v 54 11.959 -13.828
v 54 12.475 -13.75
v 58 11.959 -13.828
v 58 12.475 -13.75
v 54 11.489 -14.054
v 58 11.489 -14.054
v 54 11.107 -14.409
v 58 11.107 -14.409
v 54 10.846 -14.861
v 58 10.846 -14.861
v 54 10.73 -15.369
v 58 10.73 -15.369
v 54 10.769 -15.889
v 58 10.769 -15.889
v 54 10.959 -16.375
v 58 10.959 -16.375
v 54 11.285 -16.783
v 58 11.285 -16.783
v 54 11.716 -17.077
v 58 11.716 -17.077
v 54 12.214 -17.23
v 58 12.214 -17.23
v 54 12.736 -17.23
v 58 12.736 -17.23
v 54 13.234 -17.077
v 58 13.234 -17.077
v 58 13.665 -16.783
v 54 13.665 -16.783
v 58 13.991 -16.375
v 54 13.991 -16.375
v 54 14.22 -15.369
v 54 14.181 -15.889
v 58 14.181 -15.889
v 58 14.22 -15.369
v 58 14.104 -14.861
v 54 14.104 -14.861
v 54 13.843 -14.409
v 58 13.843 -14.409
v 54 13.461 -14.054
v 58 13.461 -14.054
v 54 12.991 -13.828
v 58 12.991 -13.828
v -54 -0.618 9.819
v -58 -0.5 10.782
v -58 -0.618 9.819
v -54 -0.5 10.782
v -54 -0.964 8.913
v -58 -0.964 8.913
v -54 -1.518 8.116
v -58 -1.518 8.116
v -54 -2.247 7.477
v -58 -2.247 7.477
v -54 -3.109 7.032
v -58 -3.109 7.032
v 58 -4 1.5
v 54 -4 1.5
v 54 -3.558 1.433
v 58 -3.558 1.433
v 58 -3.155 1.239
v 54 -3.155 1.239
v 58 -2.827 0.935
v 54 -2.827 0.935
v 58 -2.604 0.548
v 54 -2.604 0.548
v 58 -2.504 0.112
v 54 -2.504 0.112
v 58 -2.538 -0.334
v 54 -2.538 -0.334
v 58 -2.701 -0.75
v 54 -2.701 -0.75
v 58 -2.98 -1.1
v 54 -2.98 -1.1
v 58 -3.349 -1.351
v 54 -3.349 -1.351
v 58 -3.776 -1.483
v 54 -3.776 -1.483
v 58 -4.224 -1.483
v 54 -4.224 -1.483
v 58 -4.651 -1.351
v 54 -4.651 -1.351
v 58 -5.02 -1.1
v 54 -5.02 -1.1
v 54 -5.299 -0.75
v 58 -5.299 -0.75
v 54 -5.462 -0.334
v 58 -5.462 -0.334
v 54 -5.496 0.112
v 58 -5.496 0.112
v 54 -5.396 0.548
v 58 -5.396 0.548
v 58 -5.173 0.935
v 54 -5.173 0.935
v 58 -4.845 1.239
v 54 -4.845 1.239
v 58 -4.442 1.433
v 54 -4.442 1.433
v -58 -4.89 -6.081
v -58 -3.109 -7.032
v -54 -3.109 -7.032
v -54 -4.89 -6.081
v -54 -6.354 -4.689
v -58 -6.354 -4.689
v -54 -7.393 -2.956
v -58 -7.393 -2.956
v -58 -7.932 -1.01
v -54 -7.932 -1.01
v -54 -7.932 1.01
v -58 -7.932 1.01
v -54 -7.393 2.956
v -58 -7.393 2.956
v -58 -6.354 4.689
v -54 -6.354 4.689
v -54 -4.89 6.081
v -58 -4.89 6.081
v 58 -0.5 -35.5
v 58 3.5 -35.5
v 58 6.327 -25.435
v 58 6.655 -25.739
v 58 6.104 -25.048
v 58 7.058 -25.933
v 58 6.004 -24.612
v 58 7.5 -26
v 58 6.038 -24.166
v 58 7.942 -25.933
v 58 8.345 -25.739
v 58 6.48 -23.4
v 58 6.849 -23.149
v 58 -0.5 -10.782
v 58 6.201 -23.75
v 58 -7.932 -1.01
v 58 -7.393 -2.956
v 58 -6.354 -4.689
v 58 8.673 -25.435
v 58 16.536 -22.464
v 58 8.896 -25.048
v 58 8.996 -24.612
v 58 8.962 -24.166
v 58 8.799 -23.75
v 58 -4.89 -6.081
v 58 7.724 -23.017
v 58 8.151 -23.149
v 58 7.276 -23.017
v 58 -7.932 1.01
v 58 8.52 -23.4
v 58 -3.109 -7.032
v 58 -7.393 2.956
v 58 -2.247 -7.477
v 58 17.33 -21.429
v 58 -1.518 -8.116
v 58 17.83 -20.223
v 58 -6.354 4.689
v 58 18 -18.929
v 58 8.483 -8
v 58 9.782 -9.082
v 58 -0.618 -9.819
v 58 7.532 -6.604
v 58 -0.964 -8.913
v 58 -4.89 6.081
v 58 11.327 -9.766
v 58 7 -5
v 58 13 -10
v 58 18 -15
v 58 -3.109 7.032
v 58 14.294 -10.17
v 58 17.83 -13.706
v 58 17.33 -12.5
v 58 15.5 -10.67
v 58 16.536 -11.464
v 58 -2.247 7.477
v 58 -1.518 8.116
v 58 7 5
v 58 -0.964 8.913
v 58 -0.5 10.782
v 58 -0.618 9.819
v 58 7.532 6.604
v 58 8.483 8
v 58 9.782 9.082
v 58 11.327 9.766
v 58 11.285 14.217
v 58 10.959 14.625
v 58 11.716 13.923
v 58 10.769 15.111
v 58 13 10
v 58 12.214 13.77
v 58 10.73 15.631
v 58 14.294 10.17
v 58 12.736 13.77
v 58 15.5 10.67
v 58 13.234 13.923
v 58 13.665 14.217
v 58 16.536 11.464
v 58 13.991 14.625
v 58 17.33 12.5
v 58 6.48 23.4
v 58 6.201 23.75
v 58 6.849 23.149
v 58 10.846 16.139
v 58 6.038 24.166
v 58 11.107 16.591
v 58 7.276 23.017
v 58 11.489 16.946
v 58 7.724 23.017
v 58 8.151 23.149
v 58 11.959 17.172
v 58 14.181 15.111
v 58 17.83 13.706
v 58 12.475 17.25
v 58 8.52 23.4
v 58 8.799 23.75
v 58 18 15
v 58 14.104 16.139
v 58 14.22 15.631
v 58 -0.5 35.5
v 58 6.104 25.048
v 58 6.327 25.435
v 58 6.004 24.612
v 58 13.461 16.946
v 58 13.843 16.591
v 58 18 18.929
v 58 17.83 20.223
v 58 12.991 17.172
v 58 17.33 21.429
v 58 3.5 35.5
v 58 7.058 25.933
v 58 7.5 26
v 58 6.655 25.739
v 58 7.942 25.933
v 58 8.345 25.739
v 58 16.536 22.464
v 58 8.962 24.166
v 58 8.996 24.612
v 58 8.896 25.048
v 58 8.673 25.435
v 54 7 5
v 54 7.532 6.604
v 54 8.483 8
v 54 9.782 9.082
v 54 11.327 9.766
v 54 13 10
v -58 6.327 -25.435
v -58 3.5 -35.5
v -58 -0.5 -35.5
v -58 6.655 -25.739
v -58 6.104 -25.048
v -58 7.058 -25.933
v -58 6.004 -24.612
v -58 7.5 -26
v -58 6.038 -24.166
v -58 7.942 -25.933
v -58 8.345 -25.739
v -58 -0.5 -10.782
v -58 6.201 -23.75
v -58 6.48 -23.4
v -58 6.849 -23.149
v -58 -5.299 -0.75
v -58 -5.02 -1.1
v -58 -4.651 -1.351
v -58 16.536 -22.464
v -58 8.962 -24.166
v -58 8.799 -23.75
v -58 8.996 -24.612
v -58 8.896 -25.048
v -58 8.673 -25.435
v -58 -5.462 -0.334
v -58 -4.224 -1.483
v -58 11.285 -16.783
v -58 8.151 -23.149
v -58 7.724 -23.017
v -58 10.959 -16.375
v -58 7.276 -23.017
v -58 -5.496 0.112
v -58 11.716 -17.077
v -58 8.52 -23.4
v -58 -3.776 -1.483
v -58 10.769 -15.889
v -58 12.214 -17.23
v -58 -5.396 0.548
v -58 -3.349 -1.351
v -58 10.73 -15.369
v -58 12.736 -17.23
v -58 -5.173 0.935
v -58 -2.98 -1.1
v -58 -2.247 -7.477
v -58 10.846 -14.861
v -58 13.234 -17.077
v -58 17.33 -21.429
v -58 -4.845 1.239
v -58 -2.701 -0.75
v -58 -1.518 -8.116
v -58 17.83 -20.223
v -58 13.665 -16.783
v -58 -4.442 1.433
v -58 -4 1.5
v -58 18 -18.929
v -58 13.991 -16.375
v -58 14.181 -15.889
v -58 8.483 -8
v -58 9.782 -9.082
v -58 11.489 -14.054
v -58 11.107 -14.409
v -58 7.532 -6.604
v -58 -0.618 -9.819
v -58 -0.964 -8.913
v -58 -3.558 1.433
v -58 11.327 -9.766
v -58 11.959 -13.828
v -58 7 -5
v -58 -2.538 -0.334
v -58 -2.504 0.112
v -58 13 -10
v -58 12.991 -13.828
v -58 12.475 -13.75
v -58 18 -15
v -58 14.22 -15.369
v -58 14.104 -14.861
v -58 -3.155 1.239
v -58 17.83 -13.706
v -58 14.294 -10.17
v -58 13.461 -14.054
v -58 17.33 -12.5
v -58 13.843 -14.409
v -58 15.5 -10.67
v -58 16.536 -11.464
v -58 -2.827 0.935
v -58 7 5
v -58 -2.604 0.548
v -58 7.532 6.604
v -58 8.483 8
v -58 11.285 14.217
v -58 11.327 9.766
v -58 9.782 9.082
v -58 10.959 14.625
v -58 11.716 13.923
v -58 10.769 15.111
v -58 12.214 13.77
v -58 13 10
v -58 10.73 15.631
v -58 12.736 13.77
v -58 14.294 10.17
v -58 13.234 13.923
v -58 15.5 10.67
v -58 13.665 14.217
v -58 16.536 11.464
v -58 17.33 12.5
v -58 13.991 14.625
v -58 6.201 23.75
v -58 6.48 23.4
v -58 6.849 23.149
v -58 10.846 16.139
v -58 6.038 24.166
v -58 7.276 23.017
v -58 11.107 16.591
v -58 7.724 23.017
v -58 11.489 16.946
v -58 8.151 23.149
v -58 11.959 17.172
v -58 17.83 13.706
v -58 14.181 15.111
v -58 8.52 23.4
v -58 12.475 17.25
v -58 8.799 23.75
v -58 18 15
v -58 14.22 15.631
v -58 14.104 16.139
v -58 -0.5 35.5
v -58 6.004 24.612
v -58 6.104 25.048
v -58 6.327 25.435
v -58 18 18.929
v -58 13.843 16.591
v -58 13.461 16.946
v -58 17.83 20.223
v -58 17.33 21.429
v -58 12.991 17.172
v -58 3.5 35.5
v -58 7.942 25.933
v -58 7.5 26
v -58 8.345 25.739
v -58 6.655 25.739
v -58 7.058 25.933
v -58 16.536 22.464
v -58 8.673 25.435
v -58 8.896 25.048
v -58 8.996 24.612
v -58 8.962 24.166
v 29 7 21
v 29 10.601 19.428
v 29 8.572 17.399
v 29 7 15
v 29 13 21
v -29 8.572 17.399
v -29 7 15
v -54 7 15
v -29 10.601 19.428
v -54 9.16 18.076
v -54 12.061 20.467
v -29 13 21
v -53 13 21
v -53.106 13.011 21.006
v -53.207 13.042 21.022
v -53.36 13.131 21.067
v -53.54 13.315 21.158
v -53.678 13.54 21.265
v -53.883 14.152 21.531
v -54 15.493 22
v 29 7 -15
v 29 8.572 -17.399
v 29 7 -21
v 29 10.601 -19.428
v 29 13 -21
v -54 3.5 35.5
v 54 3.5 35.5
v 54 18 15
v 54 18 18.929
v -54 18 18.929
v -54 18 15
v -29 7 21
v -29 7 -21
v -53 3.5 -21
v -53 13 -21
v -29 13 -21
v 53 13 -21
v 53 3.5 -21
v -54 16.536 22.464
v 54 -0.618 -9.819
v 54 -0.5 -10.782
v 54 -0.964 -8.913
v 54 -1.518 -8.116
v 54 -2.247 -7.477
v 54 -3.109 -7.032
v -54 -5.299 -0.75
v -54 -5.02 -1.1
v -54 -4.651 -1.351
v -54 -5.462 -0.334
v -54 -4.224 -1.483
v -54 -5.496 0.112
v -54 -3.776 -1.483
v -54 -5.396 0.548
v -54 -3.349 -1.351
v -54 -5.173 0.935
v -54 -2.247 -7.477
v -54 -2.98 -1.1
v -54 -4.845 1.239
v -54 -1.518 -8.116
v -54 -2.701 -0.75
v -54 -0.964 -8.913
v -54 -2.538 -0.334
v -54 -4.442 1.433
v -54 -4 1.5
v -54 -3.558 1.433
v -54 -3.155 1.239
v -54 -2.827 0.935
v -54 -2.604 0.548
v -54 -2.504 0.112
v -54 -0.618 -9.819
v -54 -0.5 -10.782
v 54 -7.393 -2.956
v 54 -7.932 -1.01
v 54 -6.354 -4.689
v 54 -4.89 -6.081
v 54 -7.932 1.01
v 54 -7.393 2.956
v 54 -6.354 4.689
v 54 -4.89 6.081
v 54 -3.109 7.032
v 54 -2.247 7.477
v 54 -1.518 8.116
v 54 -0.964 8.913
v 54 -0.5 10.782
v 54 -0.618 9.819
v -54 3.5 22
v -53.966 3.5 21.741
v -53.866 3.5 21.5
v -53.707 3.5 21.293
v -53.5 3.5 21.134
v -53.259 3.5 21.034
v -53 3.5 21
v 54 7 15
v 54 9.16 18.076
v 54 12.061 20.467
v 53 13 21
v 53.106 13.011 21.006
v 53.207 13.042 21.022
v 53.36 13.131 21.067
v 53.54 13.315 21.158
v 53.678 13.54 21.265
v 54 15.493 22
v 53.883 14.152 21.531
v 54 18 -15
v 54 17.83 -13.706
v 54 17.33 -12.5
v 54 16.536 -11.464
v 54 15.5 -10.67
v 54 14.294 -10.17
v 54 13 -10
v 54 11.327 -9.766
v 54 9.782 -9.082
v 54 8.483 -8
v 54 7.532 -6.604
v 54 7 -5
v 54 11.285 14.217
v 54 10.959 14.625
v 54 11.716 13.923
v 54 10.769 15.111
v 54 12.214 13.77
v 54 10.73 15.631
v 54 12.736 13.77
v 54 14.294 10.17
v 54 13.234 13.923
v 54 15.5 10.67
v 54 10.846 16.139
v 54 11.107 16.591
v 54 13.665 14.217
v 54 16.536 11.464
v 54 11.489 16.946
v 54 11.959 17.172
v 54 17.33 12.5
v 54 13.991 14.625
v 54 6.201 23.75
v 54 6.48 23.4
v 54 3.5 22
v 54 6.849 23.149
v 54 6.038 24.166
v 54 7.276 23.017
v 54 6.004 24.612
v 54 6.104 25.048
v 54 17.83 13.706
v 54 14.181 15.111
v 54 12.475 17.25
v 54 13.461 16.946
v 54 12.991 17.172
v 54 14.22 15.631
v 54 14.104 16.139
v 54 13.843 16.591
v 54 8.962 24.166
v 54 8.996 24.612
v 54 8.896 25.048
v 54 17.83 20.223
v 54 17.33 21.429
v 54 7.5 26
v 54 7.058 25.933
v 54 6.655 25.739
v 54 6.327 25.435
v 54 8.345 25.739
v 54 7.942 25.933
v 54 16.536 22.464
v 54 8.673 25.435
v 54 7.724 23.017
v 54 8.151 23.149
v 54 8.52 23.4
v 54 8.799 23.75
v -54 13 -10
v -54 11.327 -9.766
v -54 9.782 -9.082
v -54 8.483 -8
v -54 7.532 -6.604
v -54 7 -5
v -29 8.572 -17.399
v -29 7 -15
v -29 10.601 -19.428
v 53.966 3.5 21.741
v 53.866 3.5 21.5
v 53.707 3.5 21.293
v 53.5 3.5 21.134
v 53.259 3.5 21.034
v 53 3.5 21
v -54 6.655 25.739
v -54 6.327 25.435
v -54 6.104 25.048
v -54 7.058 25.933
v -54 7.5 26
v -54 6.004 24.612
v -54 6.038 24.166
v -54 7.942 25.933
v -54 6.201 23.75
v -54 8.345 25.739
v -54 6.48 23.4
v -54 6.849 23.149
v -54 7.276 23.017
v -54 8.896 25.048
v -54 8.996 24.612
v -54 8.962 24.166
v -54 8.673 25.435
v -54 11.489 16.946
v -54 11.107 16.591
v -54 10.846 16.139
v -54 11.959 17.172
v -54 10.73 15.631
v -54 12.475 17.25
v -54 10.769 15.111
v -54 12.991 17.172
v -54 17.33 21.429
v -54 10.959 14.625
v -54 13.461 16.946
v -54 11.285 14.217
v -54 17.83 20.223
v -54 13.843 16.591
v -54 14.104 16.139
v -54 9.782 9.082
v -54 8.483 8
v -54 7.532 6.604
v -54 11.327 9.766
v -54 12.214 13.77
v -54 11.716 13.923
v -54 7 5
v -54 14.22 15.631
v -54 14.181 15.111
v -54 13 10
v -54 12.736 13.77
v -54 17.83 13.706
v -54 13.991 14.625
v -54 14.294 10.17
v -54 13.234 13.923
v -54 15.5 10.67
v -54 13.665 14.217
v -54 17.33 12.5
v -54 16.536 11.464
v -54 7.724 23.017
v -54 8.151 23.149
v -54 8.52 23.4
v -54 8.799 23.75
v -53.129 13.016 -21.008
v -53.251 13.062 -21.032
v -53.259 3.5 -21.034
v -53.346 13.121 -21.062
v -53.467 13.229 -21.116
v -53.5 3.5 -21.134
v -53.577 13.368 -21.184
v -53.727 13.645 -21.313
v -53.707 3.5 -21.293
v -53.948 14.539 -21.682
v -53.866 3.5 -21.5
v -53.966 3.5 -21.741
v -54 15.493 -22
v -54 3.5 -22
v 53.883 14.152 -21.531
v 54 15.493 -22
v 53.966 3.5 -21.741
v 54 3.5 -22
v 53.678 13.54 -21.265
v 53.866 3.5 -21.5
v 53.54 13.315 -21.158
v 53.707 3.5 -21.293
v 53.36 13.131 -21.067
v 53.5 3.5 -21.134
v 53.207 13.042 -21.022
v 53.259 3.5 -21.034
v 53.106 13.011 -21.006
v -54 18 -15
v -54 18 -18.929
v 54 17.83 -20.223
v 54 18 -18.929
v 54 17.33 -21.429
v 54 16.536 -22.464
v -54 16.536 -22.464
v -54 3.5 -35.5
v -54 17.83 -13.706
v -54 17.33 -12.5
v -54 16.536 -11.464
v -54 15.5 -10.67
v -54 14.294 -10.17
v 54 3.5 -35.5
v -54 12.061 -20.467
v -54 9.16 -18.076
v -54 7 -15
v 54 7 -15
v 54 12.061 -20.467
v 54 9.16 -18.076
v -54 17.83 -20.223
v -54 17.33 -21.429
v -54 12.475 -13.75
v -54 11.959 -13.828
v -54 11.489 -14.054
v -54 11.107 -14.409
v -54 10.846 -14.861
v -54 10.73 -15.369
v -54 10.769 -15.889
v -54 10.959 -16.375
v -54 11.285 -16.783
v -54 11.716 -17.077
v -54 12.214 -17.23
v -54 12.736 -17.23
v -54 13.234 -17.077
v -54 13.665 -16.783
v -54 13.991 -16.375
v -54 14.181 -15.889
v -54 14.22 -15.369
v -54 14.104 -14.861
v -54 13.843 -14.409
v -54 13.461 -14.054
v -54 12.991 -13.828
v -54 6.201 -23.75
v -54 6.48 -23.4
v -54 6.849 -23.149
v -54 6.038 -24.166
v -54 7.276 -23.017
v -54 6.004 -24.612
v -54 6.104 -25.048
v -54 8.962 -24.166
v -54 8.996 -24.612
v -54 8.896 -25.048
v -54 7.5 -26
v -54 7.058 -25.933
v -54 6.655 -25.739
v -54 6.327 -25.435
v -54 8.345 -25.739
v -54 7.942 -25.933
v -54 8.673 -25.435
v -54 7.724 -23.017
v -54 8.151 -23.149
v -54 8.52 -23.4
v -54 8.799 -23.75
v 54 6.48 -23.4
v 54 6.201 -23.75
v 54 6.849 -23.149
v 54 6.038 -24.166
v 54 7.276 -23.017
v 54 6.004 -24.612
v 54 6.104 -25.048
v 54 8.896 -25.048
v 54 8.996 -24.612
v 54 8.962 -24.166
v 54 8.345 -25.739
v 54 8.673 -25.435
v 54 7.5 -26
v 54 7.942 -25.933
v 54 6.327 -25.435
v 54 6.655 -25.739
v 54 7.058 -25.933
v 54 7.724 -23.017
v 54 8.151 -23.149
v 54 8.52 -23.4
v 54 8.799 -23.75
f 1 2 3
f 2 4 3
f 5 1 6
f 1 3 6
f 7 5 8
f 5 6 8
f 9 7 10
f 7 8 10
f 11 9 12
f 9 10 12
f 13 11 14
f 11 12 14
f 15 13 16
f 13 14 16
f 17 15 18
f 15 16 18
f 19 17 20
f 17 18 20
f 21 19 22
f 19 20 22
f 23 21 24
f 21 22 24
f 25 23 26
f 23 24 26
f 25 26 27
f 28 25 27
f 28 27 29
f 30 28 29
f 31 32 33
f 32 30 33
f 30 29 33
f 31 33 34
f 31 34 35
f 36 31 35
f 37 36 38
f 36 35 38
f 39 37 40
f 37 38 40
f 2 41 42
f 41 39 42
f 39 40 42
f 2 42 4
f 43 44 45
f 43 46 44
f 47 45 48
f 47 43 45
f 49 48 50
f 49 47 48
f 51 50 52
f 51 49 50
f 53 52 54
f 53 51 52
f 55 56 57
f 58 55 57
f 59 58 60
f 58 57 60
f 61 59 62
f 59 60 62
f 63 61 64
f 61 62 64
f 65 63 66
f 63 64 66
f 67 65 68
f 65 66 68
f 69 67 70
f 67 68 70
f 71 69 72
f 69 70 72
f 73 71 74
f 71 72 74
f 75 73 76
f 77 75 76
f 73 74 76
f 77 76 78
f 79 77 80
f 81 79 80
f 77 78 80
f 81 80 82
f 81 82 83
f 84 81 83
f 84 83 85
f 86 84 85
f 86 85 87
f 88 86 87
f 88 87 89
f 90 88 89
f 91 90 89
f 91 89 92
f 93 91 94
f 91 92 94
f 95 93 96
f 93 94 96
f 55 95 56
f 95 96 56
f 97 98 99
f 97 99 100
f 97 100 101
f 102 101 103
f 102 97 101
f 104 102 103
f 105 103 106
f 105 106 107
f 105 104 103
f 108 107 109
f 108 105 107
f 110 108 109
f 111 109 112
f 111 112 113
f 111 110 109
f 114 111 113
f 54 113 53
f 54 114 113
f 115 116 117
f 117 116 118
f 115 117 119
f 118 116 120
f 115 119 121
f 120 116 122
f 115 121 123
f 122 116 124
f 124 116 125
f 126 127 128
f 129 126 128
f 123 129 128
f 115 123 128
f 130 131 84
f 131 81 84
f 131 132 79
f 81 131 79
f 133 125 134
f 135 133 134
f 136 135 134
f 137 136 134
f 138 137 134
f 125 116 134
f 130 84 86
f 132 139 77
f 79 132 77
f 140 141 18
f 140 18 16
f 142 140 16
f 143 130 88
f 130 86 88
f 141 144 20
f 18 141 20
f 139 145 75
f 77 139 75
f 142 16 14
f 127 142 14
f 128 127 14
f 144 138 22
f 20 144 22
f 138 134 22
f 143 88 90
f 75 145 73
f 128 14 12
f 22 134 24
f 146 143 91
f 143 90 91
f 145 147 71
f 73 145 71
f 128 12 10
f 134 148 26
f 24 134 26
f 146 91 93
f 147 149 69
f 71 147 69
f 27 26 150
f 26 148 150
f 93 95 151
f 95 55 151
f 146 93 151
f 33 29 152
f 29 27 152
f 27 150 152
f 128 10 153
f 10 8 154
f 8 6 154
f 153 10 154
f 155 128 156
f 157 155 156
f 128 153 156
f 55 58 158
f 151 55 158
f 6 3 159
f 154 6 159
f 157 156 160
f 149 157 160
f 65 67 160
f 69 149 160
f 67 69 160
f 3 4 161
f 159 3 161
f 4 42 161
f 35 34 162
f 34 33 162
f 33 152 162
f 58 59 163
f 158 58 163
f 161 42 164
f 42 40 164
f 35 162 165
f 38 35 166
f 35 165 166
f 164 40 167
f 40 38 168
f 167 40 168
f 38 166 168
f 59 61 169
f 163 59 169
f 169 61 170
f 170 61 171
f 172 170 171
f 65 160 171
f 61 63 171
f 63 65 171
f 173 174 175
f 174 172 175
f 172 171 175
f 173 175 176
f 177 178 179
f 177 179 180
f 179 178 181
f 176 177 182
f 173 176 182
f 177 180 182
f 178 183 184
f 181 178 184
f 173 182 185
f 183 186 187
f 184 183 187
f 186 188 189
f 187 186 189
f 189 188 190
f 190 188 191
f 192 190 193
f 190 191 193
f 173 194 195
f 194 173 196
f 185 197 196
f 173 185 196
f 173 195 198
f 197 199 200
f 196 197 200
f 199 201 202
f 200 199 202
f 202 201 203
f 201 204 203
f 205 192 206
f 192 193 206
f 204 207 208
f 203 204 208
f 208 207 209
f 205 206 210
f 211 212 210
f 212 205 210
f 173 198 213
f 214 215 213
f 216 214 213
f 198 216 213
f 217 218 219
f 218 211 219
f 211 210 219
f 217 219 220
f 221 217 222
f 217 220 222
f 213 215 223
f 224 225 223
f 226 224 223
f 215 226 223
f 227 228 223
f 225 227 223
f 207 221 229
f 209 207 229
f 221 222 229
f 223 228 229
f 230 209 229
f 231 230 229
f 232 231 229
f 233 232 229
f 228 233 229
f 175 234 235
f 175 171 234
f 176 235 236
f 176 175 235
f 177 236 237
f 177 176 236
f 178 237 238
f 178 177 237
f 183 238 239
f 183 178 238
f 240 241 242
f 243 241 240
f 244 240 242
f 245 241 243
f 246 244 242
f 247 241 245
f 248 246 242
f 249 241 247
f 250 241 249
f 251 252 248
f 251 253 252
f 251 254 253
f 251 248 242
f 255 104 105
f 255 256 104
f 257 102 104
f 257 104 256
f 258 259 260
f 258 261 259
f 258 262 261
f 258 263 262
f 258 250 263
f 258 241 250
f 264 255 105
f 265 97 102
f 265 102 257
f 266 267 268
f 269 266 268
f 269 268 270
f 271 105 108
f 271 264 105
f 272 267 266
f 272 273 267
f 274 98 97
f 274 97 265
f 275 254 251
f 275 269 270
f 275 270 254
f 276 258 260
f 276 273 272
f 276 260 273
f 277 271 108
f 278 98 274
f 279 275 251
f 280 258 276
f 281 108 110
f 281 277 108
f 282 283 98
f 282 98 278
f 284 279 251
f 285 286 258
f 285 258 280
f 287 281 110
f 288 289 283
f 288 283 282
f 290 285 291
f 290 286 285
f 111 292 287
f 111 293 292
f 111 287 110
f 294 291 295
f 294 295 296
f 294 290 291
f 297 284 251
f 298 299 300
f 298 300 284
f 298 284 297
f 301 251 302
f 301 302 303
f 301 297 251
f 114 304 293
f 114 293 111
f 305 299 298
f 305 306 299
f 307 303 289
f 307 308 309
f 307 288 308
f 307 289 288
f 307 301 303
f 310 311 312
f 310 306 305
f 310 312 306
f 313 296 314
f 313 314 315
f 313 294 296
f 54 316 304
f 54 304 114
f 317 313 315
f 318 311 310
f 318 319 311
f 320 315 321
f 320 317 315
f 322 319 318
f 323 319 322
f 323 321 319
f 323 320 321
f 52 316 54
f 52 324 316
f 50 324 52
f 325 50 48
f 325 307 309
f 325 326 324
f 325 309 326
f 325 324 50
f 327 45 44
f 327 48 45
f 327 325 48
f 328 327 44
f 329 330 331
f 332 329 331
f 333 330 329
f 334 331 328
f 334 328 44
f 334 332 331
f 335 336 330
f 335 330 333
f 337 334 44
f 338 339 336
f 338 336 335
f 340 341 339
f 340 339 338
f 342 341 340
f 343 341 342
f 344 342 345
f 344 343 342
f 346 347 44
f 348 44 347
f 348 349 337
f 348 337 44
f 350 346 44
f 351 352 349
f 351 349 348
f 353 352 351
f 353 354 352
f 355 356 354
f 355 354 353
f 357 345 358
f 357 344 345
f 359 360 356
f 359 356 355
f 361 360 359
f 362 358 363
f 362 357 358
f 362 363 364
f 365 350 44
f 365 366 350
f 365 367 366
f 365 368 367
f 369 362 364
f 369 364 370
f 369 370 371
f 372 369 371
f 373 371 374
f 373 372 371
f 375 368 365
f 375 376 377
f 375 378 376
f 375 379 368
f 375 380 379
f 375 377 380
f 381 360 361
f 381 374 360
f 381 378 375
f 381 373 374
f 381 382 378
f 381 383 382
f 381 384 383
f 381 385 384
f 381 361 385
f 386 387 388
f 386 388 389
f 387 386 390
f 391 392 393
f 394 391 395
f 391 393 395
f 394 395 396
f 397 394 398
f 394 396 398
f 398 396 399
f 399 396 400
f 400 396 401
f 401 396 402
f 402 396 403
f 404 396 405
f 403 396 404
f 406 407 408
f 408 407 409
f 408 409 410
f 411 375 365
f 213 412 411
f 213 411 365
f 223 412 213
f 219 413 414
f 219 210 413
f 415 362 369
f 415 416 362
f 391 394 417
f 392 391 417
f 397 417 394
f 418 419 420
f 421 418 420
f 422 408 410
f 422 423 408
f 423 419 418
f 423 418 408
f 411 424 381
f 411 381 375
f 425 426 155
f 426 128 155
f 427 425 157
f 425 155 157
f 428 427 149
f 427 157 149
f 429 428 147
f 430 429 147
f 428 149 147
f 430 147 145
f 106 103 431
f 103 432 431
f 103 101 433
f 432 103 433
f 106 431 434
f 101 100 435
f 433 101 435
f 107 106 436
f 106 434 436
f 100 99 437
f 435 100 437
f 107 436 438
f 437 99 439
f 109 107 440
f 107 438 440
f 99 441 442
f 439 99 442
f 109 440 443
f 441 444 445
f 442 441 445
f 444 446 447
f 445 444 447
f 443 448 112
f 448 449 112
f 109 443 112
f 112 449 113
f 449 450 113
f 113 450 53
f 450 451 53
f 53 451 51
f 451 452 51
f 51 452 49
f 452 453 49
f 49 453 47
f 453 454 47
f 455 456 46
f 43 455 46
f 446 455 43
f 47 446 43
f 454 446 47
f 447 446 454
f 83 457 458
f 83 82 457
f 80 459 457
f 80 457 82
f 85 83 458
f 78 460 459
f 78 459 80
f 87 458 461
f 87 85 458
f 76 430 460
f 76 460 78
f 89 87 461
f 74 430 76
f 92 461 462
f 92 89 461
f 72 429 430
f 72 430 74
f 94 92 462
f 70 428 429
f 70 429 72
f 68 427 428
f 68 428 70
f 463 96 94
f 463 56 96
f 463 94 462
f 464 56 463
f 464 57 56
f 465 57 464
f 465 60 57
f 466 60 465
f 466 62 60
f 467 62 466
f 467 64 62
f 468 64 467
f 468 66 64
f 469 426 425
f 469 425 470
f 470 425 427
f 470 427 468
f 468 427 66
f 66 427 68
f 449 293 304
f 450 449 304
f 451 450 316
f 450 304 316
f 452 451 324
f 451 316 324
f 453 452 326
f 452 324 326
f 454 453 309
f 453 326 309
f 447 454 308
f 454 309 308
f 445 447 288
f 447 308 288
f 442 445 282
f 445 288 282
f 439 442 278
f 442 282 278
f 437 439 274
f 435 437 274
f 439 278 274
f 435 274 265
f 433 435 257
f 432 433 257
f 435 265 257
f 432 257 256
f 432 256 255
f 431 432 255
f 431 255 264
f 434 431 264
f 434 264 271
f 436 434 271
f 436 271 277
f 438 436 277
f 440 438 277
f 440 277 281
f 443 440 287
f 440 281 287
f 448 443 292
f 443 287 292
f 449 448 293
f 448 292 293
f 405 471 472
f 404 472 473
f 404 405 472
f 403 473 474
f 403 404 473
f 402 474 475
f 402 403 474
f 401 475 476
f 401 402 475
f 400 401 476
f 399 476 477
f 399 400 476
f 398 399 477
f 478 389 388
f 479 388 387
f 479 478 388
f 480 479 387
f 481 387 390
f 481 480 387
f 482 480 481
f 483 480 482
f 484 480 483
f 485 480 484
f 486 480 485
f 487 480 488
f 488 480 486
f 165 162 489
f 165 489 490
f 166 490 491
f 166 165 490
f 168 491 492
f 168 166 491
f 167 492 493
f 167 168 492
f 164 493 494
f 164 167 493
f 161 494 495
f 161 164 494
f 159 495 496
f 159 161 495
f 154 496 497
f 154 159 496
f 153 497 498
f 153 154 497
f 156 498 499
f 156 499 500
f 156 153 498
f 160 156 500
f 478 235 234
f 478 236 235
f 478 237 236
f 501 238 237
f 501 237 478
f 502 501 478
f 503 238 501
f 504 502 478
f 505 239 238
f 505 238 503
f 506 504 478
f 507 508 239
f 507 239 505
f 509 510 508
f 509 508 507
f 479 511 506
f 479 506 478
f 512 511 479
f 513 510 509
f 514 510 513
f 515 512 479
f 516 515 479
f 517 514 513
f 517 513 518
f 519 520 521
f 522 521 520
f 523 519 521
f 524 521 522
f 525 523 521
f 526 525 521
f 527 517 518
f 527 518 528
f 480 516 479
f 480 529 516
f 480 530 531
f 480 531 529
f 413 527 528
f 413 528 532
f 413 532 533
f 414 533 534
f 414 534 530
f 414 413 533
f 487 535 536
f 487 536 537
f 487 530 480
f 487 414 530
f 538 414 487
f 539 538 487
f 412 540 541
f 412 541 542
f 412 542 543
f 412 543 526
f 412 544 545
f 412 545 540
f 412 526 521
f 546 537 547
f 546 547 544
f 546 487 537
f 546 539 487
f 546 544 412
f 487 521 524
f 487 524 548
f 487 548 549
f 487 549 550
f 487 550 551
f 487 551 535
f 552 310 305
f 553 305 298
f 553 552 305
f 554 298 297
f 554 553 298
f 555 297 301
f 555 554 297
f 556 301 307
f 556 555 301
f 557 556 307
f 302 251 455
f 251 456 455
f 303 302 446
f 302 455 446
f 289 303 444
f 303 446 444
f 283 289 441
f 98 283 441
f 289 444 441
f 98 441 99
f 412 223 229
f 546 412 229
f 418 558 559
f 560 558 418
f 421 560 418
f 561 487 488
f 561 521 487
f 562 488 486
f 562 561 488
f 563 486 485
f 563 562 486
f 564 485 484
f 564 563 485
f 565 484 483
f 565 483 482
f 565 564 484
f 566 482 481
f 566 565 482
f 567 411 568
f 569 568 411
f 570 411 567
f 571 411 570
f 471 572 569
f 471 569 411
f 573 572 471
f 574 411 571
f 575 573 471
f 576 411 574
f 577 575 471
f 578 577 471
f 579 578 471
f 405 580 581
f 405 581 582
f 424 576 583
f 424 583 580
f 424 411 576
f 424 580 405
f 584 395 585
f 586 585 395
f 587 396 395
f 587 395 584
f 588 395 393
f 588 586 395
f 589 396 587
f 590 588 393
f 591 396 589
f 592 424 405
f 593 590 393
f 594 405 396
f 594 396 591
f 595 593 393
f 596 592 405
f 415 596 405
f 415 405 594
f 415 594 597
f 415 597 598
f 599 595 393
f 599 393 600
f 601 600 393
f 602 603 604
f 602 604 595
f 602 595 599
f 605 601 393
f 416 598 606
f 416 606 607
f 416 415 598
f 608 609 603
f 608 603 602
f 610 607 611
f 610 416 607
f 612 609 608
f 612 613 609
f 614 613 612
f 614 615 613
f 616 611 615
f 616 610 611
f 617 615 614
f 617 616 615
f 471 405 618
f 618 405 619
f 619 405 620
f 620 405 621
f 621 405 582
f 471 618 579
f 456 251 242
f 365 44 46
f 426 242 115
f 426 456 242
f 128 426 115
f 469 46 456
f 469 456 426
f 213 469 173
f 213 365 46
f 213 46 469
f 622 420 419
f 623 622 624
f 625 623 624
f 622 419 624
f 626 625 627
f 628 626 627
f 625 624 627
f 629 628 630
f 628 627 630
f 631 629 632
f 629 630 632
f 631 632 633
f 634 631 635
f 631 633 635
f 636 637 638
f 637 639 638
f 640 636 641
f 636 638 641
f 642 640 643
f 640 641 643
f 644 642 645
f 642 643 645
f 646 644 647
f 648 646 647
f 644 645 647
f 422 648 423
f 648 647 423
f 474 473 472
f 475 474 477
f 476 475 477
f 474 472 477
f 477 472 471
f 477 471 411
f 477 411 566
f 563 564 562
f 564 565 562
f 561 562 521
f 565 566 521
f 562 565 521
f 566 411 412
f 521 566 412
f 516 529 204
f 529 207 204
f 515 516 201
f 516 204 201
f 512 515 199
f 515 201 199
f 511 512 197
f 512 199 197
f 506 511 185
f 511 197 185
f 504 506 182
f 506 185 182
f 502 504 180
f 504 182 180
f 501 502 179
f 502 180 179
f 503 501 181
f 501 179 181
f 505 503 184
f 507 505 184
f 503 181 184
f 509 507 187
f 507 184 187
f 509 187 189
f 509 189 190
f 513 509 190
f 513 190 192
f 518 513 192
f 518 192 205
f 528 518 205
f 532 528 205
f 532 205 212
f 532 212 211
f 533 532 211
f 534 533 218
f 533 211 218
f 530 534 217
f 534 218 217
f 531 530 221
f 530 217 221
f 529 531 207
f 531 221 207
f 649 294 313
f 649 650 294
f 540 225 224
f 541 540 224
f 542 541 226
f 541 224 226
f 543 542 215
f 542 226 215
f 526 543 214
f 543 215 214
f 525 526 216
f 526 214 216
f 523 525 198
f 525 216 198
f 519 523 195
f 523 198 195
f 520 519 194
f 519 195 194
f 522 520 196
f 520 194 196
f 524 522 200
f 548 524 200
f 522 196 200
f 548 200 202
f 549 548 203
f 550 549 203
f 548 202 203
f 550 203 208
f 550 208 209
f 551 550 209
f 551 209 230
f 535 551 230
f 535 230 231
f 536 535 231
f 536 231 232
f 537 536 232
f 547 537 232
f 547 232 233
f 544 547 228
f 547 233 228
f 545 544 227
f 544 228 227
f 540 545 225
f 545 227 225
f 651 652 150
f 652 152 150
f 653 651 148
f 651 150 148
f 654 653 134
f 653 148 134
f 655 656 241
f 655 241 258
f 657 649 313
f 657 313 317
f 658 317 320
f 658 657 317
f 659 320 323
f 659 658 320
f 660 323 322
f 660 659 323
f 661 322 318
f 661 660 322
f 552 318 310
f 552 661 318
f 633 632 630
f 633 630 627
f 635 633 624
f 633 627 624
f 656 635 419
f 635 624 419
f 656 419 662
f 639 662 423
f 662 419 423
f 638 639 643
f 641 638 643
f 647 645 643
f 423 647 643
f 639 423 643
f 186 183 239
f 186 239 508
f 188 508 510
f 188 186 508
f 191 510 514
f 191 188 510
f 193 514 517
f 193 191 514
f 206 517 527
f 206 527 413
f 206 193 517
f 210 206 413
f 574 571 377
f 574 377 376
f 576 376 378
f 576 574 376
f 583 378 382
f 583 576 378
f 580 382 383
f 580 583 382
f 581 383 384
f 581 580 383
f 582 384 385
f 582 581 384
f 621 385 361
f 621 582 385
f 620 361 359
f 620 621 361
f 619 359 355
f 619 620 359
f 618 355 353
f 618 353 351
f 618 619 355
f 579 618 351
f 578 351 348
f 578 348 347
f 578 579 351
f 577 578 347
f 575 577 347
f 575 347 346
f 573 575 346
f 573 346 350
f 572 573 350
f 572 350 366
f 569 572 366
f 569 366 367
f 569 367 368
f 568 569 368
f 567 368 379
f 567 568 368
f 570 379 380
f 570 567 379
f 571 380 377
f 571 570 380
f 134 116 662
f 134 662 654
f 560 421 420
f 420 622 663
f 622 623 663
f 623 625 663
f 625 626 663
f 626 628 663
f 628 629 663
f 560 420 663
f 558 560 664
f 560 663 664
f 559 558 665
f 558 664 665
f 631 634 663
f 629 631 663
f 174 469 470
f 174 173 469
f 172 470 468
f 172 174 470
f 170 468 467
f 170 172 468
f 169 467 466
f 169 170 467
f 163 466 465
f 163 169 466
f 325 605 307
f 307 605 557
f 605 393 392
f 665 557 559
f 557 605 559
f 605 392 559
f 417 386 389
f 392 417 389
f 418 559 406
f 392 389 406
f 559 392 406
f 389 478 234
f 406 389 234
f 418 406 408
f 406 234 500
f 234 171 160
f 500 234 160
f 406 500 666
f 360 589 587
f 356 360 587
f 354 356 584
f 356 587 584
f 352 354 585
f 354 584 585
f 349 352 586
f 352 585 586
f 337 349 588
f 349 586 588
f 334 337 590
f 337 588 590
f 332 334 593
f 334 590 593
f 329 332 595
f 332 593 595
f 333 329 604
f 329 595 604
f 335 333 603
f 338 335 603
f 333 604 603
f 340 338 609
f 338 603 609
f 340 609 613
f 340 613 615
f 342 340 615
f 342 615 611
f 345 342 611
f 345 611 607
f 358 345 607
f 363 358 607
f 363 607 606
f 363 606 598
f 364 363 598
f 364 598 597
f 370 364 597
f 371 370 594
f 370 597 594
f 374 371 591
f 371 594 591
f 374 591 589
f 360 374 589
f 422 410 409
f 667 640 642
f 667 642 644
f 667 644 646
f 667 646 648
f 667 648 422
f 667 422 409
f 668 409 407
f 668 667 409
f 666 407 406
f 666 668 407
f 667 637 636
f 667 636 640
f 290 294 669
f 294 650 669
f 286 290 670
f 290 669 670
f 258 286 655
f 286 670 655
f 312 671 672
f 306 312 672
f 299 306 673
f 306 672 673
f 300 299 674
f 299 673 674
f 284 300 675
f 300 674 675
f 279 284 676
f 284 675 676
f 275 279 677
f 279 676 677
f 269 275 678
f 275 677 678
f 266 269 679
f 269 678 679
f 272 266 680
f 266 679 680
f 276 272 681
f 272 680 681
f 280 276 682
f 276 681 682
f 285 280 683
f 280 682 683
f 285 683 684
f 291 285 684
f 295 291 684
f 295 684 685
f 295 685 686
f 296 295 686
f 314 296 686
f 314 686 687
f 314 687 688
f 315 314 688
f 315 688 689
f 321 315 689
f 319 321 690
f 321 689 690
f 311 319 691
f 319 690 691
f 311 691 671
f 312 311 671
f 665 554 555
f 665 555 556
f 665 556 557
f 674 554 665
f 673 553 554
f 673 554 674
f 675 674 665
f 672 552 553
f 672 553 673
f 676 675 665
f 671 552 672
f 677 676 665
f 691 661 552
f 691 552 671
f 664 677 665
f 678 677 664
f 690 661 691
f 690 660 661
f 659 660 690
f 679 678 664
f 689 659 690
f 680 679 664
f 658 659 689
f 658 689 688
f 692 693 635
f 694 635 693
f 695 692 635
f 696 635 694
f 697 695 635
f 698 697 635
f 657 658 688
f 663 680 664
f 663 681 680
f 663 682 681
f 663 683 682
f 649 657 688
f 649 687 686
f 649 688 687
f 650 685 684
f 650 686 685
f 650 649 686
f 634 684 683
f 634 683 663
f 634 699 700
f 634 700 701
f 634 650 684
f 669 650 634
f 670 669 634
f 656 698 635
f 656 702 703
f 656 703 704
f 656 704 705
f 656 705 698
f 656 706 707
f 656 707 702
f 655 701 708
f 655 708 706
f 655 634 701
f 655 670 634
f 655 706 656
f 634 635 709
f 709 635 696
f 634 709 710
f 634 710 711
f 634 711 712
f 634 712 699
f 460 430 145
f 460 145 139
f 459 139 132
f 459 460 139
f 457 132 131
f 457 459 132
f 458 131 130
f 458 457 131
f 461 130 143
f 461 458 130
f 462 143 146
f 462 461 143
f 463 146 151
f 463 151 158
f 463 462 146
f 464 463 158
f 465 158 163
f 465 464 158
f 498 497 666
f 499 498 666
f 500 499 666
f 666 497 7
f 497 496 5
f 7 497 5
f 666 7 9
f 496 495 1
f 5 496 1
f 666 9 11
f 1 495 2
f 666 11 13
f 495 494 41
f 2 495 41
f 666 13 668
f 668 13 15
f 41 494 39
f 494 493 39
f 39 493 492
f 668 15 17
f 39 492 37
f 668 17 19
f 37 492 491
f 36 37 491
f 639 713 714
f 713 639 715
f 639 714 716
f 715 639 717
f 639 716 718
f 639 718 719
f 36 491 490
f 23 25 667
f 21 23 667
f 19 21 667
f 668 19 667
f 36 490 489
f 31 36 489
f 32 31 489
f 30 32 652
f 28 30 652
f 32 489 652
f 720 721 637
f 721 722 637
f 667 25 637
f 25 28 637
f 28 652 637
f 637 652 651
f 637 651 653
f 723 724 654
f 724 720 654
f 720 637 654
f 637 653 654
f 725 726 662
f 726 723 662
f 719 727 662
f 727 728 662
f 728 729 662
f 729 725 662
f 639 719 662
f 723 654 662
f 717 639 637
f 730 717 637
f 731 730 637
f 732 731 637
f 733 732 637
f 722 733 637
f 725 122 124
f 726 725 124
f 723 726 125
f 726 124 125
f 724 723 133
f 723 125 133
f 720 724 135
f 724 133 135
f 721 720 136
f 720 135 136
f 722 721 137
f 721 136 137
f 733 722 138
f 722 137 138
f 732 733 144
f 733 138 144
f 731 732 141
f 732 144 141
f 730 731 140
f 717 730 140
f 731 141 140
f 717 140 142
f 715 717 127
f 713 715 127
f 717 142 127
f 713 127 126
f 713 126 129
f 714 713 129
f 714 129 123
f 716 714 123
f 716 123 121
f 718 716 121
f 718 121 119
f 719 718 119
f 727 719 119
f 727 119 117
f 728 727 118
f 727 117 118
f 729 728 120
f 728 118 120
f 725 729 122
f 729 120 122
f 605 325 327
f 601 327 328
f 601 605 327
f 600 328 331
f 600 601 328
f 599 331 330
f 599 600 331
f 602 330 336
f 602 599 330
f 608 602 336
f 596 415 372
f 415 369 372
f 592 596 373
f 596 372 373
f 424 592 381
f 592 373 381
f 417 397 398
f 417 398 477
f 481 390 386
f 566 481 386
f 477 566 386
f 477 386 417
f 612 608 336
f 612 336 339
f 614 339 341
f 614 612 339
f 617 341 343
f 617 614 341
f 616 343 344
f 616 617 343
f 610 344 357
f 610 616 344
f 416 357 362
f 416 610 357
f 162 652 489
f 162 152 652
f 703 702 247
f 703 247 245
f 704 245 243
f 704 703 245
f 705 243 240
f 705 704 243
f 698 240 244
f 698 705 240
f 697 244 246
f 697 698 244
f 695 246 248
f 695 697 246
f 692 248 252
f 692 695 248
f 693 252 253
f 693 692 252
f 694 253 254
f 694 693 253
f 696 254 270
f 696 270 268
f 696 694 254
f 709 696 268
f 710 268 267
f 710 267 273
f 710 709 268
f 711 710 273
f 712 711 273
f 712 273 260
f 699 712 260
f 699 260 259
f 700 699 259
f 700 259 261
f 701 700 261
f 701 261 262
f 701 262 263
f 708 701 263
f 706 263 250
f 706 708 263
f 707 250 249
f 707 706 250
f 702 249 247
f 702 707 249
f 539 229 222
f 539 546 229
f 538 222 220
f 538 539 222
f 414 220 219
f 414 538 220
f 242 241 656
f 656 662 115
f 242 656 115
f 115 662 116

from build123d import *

# Parameters (mm, degrees)
BOSS_EXTRUDE1_START             = 3.5
SKETCH1_W                       = 116
SKETCH1_H                       = 42
BOSS_EXTRUDE1_DEPTH             = 3.5
BOSS_EXTRUDE2_REACH             = 64.081
SKETCH2_R                       = 1.75
BOSS_EXTRUDE2_DIRECTION_2_REACH = 64.081
SKETCH2_3_R                     = 1.75
CUT_EXTRUDE1_DEPTH              = 54
BOSS_EXTRUDE3_DEPTH             = 25
BOSS_EXTRUDE5_START             = -4
SKETCH4_R                       = 1.5
BOSS_EXTRUDE5_DEPTH             = 4
SKETCH5_R                       = 1.5
BOSS_EXTRUDE6_DEPTH             = 4
FILLET1_R                       = 5
FILLET2_R                       = 1
SKETCH6_W                       = 116
SKETCH6_H                       = 71
BOSS_EXTRUDE7_DEPTH             = 4
SKETCH7_R                       = 1.5
BOSS_EXTRUDE8_DEPTH             = 4
LPATTERN1_COUNT                 = 2
LPATTERN1_PITCH                 = 112
FILLET3_R                       = 4


with BuildPart() as part:
    # Sketch1 → Boss-Extrude1 (new body)
    with BuildSketch(Plane(origin=(0, 0, 0), x_dir=(1, 0, 0), z_dir=(0, 1, 0)).offset(BOSS_EXTRUDE1_START)):
        Rectangle(SKETCH1_W, SKETCH1_H)
    extrude(amount=BOSS_EXTRUDE1_DEPTH)

    # Boss-Extrude2: up to this face of the body (flat: up to its plane)
    boss_extrude2_end = Plane(part.part.faces().sort_by_distance((58, 5.25, 0))[0])
    # Sketch2 → Boss-Extrude2 (add, up to the picked face)
    with BuildSketch(Plane(origin=(0, 0, 0), x_dir=(0, 0, -1), z_dir=(1, 0, 0)), mode=Mode.PRIVATE) as boss_extrude2_sk1:
        with BuildLine():
            ThreePointArc((10, 13), (8.586149806, 9.094875162), (5, 7))
            Line((5, 7), (10, 7))
            Line((10, 7), (21, 7))
            Line((21, 7), (21, 18))
            Line((21, 18), (15, 18))
            ThreePointArc((15, 18), (11.464466094, 16.535533906), (10, 13))
        make_face()
        with Locations(Location((15.5, 12.475, 0), (0, 0, 180))):
            Circle(SKETCH2_R, mode=Mode.SUBTRACT)
    boss_extrude2_tool1 = split(extrude(boss_extrude2_sk1.sketch, amount=BOSS_EXTRUDE2_REACH, mode=Mode.PRIVATE), bisect_by=boss_extrude2_end, keep=Keep.BOTH, mode=Mode.PRIVATE)
    # Sketch2 → Boss-Extrude2 (add, up to the picked face)
    with BuildSketch(Plane(origin=(0, 0, 0), x_dir=(0, 0, -1), z_dir=(1, 0, 0)), mode=Mode.PRIVATE) as boss_extrude2_sk2:
        with BuildLine():
            Line((-21, 18), (-21, 7))
            Line((-21, 7), (-5, 7))
            ThreePointArc((-5, 7), (-8.586149806, 9.094875162), (-10, 13))
            ThreePointArc((-10, 13), (-11.464466094, 16.535533906), (-15, 18))
            Line((-15, 18), (-21, 18))
        make_face()
        with Locations(Location((-15.5, 12.475, 0), (0, 0, 180))):
            Circle(SKETCH2_R, mode=Mode.SUBTRACT)
    boss_extrude2_tool2 = split(extrude(boss_extrude2_sk2.sketch, amount=BOSS_EXTRUDE2_REACH, mode=Mode.PRIVATE), bisect_by=boss_extrude2_end, keep=Keep.BOTH, mode=Mode.PRIVATE)
    add(boss_extrude2_tool1.solids().sort_by(Axis((0, 8.970574, -8.735311), (1, 0, 0)))[0])
    add(boss_extrude2_tool2.solids().sort_by(Axis((0, 12.5, 20.805835), (1, 0, 0)))[0])

    # Boss-Extrude2 direction 2: up to this face of the body (flat: up to its plane)
    boss_extrude2_direction_2_end = Plane(part.part.faces().sort_by_distance((-58, 5.25, 0))[0])
    # Sketch2 → Boss-Extrude2 direction 2 (add, up to the picked face)
    with BuildSketch(Plane(origin=(0, 0, 0), x_dir=(0, 0, -1), z_dir=(1, 0, 0)), mode=Mode.PRIVATE) as boss_extrude2_direction_2_sk1:
        with BuildLine():
            ThreePointArc((10, 13), (8.586149806, 9.094875162), (5, 7))
            Line((5, 7), (10, 7))
            Line((10, 7), (21, 7))
            Line((21, 7), (21, 18))
            Line((21, 18), (15, 18))
            ThreePointArc((15, 18), (11.464466094, 16.535533906), (10, 13))
        make_face()
        with Locations(Location((15.5, 12.475, 0), (0, 0, 180))):
            Circle(SKETCH2_R, mode=Mode.SUBTRACT)
    boss_extrude2_direction_2_tool1 = split(extrude(boss_extrude2_direction_2_sk1.sketch, amount=-BOSS_EXTRUDE2_DIRECTION_2_REACH, mode=Mode.PRIVATE), bisect_by=boss_extrude2_direction_2_end, keep=Keep.BOTH, mode=Mode.PRIVATE)
    # Sketch2 → Boss-Extrude2 direction 2 (add, up to the picked face)
    with BuildSketch(Plane(origin=(0, 0, 0), x_dir=(0, 0, -1), z_dir=(1, 0, 0)), mode=Mode.PRIVATE) as boss_extrude2_direction_2_sk2:
        with BuildLine():
            Line((-21, 18), (-21, 7))
            Line((-21, 7), (-5, 7))
            ThreePointArc((-5, 7), (-8.586149806, 9.094875162), (-10, 13))
            ThreePointArc((-10, 13), (-11.464466094, 16.535533906), (-15, 18))
            Line((-15, 18), (-21, 18))
        make_face()
        with Locations(Location((-15.5, 12.475, 0), (0, 0, 180))):
            Circle(SKETCH2_R, mode=Mode.SUBTRACT)
    boss_extrude2_direction_2_tool2 = split(extrude(boss_extrude2_direction_2_sk2.sketch, amount=-BOSS_EXTRUDE2_DIRECTION_2_REACH, mode=Mode.PRIVATE), bisect_by=boss_extrude2_direction_2_end, keep=Keep.BOTH, mode=Mode.PRIVATE)
    add(boss_extrude2_direction_2_tool1.solids().sort_by(Axis((0, 8.970574, -8.735311), (-1, 0, 0)))[0])
    add(boss_extrude2_direction_2_tool2.solids().sort_by(Axis((0, 12.5, 20.805835), (-1, 0, 0)))[0])

    # Sketch2<3> → Cut-Extrude1 (cut, symmetric)
    # profile 1 of 2: a face of its own
    with BuildSketch(Plane(origin=(0, 0, 0), x_dir=(0, 0, -1), z_dir=(1, 0, 0))):
        with BuildLine():
            ThreePointArc((10, 13), (8.586149806, 9.094875162), (5, 7))
            Line((5, 7), (10, 7))
            Line((10, 7), (21, 7))
            Line((21, 7), (21, 18))
            Line((21, 18), (15, 18))
            ThreePointArc((15, 18), (11.464466094, 16.535533906), (10, 13))
        make_face()
        with Locations((15.5, 12.475)):
            Circle(SKETCH2_3_R, mode=Mode.SUBTRACT)
    # profile 2 of 2: a face of its own
    with BuildSketch(Plane(origin=(0, 0, 0), x_dir=(0, 0, -1), z_dir=(1, 0, 0))):
        with BuildLine():
            Line((-21, 18), (-21, 7))
            Line((-21, 7), (-5, 7))
            ThreePointArc((-5, 7), (-8.586149806, 9.094875162), (-10, 13))
            ThreePointArc((-10, 13), (-11.464466094, 16.535533906), (-15, 18))
            Line((-15, 18), (-21, 18))
        make_face()
        with Locations((-15.5, 12.475)):
            Circle(SKETCH2_3_R, mode=Mode.SUBTRACT)
    extrude(amount=CUT_EXTRUDE1_DEPTH, both=True, mode=Mode.SUBTRACT)

    # Sketch3 → Boss-Extrude3 (add)
    with BuildSketch(Plane(origin=(-54, 0, 0), x_dir=(0, 0, -1), z_dir=(1, 0, 0))):
        with BuildLine():
            Line((-21, 7), (-15, 7))
            ThreePointArc((-15, 7), (-18.465513805, 9.534486195), (-21, 13))
            Line((-21, 13), (-21, 7))
        make_face()
        with BuildLine():
            Line((21, 7), (21, 13))
            ThreePointArc((21, 13), (18.465513805, 9.534486195), (15, 7))
            Line((15, 7), (21, 7))
        make_face()
    boss_extrude3 = extrude(amount=BOSS_EXTRUDE3_DEPTH)

    # Mirror4: Boss-Extrude3 across plane
    add(boss_extrude3.mirror(Plane(origin=(0, 0, 0), x_dir=(0, 0, 1), z_dir=(1, 0, 0))))

    # Sketch4 → Boss-Extrude5 (add)
    # profile 1 of 2: a face of its own
    with BuildSketch(Plane.ZY.offset(58).offset(BOSS_EXTRUDE5_START)):
        Polygon((21, 18), (35.5, 3.5), (21, 3.5), align=None)
        with Locations((24.5, 7.5)):
            Circle(SKETCH4_R, mode=Mode.SUBTRACT)
    # profile 2 of 2: a face of its own
    with BuildSketch(Plane.ZY.offset(58).offset(BOSS_EXTRUDE5_START)):
        Polygon((-21, 18), (-21, 3.5), (-35.5, 3.5), align=None)
        with Locations(Location((-24.5, 7.5, 0), (0, 0, 180))):
            Circle(SKETCH4_R, mode=Mode.SUBTRACT)
    extrude(amount=BOSS_EXTRUDE5_DEPTH)

    # Sketch5 → Boss-Extrude6 (add)
    # profile 1 of 2: a face of its own
    with BuildSketch(Plane(origin=(58, 0, 0), x_dir=(0, 0, -1), z_dir=(1, 0, 0))):
        Polygon((-35.5, 3.5), (-21, 18), (-21, 3.5), align=None)
        with Locations(Location((-24.5, 7.5, 0), (0, 0, 180))):
            Circle(SKETCH5_R, mode=Mode.SUBTRACT)
    # profile 2 of 2: a face of its own
    with BuildSketch(Plane(origin=(58, 0, 0), x_dir=(0, 0, -1), z_dir=(1, 0, 0))):
        Polygon((21, 18), (21, 3.5), (35.5, 3.5), align=None)
        with Locations((24.5, 7.5)):
            Circle(SKETCH5_R, mode=Mode.SUBTRACT)
    extrude(amount=-BOSS_EXTRUDE6_DEPTH)

    # Fillet1
    fillet1_edges = [part.edges().sort_by_distance(p)[0] for p in [
        (56, 18, -21),
        (56, 18, 21),
        (-56, 18, 21),
        (-56, 18, -21),
    ]]
    fillet(fillet1_edges, radius=FILLET1_R)

    # Fillet2
    fillet2_edges = [part.edges().sort_by_distance(p)[0] for p in [
        (-54, 8.25, 21),
        (-54, 8.25, -21),
        (54, 8.25, 21),
        (54, 8.25, -21),
    ]]
    fillet(fillet2_edges, radius=FILLET2_R)

    # Sketch6 → Boss-Extrude7 (add)
    with BuildSketch(Plane.XZ.offset(-3.5)):
        Rectangle(SKETCH6_W, SKETCH6_H)
    extrude(amount=BOSS_EXTRUDE7_DEPTH)

    # Sketch7 → Boss-Extrude8 (add)
    with BuildSketch(Plane.ZY.offset(58)):
        with BuildLine():
            Line((7.5, -0.5), (-7.5, -0.5))
            ThreePointArc((-7.5, -0.5), (0, -8), (7.5, -0.5))
        make_face()
        with Locations((0, -4)):
            Circle(SKETCH7_R, mode=Mode.SUBTRACT)
    boss_extrude8 = extrude(amount=-BOSS_EXTRUDE8_DEPTH)

    # LPattern1: Boss-Extrude8 ×2
    with Locations(*[(i * LPATTERN1_PITCH, 0, 0) for i in range(1, LPATTERN1_COUNT)]):
        add(boss_extrude8)

    # Fillet3
    fillet3_edges = [part.edges().sort_by_distance(p)[0] for p in [
        (-56, -0.5, 7.5),
        (-56, -0.5, -7.5),
        (56, -0.5, 7.5),
        (56, -0.5, -7.5),
    ]]
    fillet(fillet3_edges, radius=FILLET3_R)


solid = part.part
